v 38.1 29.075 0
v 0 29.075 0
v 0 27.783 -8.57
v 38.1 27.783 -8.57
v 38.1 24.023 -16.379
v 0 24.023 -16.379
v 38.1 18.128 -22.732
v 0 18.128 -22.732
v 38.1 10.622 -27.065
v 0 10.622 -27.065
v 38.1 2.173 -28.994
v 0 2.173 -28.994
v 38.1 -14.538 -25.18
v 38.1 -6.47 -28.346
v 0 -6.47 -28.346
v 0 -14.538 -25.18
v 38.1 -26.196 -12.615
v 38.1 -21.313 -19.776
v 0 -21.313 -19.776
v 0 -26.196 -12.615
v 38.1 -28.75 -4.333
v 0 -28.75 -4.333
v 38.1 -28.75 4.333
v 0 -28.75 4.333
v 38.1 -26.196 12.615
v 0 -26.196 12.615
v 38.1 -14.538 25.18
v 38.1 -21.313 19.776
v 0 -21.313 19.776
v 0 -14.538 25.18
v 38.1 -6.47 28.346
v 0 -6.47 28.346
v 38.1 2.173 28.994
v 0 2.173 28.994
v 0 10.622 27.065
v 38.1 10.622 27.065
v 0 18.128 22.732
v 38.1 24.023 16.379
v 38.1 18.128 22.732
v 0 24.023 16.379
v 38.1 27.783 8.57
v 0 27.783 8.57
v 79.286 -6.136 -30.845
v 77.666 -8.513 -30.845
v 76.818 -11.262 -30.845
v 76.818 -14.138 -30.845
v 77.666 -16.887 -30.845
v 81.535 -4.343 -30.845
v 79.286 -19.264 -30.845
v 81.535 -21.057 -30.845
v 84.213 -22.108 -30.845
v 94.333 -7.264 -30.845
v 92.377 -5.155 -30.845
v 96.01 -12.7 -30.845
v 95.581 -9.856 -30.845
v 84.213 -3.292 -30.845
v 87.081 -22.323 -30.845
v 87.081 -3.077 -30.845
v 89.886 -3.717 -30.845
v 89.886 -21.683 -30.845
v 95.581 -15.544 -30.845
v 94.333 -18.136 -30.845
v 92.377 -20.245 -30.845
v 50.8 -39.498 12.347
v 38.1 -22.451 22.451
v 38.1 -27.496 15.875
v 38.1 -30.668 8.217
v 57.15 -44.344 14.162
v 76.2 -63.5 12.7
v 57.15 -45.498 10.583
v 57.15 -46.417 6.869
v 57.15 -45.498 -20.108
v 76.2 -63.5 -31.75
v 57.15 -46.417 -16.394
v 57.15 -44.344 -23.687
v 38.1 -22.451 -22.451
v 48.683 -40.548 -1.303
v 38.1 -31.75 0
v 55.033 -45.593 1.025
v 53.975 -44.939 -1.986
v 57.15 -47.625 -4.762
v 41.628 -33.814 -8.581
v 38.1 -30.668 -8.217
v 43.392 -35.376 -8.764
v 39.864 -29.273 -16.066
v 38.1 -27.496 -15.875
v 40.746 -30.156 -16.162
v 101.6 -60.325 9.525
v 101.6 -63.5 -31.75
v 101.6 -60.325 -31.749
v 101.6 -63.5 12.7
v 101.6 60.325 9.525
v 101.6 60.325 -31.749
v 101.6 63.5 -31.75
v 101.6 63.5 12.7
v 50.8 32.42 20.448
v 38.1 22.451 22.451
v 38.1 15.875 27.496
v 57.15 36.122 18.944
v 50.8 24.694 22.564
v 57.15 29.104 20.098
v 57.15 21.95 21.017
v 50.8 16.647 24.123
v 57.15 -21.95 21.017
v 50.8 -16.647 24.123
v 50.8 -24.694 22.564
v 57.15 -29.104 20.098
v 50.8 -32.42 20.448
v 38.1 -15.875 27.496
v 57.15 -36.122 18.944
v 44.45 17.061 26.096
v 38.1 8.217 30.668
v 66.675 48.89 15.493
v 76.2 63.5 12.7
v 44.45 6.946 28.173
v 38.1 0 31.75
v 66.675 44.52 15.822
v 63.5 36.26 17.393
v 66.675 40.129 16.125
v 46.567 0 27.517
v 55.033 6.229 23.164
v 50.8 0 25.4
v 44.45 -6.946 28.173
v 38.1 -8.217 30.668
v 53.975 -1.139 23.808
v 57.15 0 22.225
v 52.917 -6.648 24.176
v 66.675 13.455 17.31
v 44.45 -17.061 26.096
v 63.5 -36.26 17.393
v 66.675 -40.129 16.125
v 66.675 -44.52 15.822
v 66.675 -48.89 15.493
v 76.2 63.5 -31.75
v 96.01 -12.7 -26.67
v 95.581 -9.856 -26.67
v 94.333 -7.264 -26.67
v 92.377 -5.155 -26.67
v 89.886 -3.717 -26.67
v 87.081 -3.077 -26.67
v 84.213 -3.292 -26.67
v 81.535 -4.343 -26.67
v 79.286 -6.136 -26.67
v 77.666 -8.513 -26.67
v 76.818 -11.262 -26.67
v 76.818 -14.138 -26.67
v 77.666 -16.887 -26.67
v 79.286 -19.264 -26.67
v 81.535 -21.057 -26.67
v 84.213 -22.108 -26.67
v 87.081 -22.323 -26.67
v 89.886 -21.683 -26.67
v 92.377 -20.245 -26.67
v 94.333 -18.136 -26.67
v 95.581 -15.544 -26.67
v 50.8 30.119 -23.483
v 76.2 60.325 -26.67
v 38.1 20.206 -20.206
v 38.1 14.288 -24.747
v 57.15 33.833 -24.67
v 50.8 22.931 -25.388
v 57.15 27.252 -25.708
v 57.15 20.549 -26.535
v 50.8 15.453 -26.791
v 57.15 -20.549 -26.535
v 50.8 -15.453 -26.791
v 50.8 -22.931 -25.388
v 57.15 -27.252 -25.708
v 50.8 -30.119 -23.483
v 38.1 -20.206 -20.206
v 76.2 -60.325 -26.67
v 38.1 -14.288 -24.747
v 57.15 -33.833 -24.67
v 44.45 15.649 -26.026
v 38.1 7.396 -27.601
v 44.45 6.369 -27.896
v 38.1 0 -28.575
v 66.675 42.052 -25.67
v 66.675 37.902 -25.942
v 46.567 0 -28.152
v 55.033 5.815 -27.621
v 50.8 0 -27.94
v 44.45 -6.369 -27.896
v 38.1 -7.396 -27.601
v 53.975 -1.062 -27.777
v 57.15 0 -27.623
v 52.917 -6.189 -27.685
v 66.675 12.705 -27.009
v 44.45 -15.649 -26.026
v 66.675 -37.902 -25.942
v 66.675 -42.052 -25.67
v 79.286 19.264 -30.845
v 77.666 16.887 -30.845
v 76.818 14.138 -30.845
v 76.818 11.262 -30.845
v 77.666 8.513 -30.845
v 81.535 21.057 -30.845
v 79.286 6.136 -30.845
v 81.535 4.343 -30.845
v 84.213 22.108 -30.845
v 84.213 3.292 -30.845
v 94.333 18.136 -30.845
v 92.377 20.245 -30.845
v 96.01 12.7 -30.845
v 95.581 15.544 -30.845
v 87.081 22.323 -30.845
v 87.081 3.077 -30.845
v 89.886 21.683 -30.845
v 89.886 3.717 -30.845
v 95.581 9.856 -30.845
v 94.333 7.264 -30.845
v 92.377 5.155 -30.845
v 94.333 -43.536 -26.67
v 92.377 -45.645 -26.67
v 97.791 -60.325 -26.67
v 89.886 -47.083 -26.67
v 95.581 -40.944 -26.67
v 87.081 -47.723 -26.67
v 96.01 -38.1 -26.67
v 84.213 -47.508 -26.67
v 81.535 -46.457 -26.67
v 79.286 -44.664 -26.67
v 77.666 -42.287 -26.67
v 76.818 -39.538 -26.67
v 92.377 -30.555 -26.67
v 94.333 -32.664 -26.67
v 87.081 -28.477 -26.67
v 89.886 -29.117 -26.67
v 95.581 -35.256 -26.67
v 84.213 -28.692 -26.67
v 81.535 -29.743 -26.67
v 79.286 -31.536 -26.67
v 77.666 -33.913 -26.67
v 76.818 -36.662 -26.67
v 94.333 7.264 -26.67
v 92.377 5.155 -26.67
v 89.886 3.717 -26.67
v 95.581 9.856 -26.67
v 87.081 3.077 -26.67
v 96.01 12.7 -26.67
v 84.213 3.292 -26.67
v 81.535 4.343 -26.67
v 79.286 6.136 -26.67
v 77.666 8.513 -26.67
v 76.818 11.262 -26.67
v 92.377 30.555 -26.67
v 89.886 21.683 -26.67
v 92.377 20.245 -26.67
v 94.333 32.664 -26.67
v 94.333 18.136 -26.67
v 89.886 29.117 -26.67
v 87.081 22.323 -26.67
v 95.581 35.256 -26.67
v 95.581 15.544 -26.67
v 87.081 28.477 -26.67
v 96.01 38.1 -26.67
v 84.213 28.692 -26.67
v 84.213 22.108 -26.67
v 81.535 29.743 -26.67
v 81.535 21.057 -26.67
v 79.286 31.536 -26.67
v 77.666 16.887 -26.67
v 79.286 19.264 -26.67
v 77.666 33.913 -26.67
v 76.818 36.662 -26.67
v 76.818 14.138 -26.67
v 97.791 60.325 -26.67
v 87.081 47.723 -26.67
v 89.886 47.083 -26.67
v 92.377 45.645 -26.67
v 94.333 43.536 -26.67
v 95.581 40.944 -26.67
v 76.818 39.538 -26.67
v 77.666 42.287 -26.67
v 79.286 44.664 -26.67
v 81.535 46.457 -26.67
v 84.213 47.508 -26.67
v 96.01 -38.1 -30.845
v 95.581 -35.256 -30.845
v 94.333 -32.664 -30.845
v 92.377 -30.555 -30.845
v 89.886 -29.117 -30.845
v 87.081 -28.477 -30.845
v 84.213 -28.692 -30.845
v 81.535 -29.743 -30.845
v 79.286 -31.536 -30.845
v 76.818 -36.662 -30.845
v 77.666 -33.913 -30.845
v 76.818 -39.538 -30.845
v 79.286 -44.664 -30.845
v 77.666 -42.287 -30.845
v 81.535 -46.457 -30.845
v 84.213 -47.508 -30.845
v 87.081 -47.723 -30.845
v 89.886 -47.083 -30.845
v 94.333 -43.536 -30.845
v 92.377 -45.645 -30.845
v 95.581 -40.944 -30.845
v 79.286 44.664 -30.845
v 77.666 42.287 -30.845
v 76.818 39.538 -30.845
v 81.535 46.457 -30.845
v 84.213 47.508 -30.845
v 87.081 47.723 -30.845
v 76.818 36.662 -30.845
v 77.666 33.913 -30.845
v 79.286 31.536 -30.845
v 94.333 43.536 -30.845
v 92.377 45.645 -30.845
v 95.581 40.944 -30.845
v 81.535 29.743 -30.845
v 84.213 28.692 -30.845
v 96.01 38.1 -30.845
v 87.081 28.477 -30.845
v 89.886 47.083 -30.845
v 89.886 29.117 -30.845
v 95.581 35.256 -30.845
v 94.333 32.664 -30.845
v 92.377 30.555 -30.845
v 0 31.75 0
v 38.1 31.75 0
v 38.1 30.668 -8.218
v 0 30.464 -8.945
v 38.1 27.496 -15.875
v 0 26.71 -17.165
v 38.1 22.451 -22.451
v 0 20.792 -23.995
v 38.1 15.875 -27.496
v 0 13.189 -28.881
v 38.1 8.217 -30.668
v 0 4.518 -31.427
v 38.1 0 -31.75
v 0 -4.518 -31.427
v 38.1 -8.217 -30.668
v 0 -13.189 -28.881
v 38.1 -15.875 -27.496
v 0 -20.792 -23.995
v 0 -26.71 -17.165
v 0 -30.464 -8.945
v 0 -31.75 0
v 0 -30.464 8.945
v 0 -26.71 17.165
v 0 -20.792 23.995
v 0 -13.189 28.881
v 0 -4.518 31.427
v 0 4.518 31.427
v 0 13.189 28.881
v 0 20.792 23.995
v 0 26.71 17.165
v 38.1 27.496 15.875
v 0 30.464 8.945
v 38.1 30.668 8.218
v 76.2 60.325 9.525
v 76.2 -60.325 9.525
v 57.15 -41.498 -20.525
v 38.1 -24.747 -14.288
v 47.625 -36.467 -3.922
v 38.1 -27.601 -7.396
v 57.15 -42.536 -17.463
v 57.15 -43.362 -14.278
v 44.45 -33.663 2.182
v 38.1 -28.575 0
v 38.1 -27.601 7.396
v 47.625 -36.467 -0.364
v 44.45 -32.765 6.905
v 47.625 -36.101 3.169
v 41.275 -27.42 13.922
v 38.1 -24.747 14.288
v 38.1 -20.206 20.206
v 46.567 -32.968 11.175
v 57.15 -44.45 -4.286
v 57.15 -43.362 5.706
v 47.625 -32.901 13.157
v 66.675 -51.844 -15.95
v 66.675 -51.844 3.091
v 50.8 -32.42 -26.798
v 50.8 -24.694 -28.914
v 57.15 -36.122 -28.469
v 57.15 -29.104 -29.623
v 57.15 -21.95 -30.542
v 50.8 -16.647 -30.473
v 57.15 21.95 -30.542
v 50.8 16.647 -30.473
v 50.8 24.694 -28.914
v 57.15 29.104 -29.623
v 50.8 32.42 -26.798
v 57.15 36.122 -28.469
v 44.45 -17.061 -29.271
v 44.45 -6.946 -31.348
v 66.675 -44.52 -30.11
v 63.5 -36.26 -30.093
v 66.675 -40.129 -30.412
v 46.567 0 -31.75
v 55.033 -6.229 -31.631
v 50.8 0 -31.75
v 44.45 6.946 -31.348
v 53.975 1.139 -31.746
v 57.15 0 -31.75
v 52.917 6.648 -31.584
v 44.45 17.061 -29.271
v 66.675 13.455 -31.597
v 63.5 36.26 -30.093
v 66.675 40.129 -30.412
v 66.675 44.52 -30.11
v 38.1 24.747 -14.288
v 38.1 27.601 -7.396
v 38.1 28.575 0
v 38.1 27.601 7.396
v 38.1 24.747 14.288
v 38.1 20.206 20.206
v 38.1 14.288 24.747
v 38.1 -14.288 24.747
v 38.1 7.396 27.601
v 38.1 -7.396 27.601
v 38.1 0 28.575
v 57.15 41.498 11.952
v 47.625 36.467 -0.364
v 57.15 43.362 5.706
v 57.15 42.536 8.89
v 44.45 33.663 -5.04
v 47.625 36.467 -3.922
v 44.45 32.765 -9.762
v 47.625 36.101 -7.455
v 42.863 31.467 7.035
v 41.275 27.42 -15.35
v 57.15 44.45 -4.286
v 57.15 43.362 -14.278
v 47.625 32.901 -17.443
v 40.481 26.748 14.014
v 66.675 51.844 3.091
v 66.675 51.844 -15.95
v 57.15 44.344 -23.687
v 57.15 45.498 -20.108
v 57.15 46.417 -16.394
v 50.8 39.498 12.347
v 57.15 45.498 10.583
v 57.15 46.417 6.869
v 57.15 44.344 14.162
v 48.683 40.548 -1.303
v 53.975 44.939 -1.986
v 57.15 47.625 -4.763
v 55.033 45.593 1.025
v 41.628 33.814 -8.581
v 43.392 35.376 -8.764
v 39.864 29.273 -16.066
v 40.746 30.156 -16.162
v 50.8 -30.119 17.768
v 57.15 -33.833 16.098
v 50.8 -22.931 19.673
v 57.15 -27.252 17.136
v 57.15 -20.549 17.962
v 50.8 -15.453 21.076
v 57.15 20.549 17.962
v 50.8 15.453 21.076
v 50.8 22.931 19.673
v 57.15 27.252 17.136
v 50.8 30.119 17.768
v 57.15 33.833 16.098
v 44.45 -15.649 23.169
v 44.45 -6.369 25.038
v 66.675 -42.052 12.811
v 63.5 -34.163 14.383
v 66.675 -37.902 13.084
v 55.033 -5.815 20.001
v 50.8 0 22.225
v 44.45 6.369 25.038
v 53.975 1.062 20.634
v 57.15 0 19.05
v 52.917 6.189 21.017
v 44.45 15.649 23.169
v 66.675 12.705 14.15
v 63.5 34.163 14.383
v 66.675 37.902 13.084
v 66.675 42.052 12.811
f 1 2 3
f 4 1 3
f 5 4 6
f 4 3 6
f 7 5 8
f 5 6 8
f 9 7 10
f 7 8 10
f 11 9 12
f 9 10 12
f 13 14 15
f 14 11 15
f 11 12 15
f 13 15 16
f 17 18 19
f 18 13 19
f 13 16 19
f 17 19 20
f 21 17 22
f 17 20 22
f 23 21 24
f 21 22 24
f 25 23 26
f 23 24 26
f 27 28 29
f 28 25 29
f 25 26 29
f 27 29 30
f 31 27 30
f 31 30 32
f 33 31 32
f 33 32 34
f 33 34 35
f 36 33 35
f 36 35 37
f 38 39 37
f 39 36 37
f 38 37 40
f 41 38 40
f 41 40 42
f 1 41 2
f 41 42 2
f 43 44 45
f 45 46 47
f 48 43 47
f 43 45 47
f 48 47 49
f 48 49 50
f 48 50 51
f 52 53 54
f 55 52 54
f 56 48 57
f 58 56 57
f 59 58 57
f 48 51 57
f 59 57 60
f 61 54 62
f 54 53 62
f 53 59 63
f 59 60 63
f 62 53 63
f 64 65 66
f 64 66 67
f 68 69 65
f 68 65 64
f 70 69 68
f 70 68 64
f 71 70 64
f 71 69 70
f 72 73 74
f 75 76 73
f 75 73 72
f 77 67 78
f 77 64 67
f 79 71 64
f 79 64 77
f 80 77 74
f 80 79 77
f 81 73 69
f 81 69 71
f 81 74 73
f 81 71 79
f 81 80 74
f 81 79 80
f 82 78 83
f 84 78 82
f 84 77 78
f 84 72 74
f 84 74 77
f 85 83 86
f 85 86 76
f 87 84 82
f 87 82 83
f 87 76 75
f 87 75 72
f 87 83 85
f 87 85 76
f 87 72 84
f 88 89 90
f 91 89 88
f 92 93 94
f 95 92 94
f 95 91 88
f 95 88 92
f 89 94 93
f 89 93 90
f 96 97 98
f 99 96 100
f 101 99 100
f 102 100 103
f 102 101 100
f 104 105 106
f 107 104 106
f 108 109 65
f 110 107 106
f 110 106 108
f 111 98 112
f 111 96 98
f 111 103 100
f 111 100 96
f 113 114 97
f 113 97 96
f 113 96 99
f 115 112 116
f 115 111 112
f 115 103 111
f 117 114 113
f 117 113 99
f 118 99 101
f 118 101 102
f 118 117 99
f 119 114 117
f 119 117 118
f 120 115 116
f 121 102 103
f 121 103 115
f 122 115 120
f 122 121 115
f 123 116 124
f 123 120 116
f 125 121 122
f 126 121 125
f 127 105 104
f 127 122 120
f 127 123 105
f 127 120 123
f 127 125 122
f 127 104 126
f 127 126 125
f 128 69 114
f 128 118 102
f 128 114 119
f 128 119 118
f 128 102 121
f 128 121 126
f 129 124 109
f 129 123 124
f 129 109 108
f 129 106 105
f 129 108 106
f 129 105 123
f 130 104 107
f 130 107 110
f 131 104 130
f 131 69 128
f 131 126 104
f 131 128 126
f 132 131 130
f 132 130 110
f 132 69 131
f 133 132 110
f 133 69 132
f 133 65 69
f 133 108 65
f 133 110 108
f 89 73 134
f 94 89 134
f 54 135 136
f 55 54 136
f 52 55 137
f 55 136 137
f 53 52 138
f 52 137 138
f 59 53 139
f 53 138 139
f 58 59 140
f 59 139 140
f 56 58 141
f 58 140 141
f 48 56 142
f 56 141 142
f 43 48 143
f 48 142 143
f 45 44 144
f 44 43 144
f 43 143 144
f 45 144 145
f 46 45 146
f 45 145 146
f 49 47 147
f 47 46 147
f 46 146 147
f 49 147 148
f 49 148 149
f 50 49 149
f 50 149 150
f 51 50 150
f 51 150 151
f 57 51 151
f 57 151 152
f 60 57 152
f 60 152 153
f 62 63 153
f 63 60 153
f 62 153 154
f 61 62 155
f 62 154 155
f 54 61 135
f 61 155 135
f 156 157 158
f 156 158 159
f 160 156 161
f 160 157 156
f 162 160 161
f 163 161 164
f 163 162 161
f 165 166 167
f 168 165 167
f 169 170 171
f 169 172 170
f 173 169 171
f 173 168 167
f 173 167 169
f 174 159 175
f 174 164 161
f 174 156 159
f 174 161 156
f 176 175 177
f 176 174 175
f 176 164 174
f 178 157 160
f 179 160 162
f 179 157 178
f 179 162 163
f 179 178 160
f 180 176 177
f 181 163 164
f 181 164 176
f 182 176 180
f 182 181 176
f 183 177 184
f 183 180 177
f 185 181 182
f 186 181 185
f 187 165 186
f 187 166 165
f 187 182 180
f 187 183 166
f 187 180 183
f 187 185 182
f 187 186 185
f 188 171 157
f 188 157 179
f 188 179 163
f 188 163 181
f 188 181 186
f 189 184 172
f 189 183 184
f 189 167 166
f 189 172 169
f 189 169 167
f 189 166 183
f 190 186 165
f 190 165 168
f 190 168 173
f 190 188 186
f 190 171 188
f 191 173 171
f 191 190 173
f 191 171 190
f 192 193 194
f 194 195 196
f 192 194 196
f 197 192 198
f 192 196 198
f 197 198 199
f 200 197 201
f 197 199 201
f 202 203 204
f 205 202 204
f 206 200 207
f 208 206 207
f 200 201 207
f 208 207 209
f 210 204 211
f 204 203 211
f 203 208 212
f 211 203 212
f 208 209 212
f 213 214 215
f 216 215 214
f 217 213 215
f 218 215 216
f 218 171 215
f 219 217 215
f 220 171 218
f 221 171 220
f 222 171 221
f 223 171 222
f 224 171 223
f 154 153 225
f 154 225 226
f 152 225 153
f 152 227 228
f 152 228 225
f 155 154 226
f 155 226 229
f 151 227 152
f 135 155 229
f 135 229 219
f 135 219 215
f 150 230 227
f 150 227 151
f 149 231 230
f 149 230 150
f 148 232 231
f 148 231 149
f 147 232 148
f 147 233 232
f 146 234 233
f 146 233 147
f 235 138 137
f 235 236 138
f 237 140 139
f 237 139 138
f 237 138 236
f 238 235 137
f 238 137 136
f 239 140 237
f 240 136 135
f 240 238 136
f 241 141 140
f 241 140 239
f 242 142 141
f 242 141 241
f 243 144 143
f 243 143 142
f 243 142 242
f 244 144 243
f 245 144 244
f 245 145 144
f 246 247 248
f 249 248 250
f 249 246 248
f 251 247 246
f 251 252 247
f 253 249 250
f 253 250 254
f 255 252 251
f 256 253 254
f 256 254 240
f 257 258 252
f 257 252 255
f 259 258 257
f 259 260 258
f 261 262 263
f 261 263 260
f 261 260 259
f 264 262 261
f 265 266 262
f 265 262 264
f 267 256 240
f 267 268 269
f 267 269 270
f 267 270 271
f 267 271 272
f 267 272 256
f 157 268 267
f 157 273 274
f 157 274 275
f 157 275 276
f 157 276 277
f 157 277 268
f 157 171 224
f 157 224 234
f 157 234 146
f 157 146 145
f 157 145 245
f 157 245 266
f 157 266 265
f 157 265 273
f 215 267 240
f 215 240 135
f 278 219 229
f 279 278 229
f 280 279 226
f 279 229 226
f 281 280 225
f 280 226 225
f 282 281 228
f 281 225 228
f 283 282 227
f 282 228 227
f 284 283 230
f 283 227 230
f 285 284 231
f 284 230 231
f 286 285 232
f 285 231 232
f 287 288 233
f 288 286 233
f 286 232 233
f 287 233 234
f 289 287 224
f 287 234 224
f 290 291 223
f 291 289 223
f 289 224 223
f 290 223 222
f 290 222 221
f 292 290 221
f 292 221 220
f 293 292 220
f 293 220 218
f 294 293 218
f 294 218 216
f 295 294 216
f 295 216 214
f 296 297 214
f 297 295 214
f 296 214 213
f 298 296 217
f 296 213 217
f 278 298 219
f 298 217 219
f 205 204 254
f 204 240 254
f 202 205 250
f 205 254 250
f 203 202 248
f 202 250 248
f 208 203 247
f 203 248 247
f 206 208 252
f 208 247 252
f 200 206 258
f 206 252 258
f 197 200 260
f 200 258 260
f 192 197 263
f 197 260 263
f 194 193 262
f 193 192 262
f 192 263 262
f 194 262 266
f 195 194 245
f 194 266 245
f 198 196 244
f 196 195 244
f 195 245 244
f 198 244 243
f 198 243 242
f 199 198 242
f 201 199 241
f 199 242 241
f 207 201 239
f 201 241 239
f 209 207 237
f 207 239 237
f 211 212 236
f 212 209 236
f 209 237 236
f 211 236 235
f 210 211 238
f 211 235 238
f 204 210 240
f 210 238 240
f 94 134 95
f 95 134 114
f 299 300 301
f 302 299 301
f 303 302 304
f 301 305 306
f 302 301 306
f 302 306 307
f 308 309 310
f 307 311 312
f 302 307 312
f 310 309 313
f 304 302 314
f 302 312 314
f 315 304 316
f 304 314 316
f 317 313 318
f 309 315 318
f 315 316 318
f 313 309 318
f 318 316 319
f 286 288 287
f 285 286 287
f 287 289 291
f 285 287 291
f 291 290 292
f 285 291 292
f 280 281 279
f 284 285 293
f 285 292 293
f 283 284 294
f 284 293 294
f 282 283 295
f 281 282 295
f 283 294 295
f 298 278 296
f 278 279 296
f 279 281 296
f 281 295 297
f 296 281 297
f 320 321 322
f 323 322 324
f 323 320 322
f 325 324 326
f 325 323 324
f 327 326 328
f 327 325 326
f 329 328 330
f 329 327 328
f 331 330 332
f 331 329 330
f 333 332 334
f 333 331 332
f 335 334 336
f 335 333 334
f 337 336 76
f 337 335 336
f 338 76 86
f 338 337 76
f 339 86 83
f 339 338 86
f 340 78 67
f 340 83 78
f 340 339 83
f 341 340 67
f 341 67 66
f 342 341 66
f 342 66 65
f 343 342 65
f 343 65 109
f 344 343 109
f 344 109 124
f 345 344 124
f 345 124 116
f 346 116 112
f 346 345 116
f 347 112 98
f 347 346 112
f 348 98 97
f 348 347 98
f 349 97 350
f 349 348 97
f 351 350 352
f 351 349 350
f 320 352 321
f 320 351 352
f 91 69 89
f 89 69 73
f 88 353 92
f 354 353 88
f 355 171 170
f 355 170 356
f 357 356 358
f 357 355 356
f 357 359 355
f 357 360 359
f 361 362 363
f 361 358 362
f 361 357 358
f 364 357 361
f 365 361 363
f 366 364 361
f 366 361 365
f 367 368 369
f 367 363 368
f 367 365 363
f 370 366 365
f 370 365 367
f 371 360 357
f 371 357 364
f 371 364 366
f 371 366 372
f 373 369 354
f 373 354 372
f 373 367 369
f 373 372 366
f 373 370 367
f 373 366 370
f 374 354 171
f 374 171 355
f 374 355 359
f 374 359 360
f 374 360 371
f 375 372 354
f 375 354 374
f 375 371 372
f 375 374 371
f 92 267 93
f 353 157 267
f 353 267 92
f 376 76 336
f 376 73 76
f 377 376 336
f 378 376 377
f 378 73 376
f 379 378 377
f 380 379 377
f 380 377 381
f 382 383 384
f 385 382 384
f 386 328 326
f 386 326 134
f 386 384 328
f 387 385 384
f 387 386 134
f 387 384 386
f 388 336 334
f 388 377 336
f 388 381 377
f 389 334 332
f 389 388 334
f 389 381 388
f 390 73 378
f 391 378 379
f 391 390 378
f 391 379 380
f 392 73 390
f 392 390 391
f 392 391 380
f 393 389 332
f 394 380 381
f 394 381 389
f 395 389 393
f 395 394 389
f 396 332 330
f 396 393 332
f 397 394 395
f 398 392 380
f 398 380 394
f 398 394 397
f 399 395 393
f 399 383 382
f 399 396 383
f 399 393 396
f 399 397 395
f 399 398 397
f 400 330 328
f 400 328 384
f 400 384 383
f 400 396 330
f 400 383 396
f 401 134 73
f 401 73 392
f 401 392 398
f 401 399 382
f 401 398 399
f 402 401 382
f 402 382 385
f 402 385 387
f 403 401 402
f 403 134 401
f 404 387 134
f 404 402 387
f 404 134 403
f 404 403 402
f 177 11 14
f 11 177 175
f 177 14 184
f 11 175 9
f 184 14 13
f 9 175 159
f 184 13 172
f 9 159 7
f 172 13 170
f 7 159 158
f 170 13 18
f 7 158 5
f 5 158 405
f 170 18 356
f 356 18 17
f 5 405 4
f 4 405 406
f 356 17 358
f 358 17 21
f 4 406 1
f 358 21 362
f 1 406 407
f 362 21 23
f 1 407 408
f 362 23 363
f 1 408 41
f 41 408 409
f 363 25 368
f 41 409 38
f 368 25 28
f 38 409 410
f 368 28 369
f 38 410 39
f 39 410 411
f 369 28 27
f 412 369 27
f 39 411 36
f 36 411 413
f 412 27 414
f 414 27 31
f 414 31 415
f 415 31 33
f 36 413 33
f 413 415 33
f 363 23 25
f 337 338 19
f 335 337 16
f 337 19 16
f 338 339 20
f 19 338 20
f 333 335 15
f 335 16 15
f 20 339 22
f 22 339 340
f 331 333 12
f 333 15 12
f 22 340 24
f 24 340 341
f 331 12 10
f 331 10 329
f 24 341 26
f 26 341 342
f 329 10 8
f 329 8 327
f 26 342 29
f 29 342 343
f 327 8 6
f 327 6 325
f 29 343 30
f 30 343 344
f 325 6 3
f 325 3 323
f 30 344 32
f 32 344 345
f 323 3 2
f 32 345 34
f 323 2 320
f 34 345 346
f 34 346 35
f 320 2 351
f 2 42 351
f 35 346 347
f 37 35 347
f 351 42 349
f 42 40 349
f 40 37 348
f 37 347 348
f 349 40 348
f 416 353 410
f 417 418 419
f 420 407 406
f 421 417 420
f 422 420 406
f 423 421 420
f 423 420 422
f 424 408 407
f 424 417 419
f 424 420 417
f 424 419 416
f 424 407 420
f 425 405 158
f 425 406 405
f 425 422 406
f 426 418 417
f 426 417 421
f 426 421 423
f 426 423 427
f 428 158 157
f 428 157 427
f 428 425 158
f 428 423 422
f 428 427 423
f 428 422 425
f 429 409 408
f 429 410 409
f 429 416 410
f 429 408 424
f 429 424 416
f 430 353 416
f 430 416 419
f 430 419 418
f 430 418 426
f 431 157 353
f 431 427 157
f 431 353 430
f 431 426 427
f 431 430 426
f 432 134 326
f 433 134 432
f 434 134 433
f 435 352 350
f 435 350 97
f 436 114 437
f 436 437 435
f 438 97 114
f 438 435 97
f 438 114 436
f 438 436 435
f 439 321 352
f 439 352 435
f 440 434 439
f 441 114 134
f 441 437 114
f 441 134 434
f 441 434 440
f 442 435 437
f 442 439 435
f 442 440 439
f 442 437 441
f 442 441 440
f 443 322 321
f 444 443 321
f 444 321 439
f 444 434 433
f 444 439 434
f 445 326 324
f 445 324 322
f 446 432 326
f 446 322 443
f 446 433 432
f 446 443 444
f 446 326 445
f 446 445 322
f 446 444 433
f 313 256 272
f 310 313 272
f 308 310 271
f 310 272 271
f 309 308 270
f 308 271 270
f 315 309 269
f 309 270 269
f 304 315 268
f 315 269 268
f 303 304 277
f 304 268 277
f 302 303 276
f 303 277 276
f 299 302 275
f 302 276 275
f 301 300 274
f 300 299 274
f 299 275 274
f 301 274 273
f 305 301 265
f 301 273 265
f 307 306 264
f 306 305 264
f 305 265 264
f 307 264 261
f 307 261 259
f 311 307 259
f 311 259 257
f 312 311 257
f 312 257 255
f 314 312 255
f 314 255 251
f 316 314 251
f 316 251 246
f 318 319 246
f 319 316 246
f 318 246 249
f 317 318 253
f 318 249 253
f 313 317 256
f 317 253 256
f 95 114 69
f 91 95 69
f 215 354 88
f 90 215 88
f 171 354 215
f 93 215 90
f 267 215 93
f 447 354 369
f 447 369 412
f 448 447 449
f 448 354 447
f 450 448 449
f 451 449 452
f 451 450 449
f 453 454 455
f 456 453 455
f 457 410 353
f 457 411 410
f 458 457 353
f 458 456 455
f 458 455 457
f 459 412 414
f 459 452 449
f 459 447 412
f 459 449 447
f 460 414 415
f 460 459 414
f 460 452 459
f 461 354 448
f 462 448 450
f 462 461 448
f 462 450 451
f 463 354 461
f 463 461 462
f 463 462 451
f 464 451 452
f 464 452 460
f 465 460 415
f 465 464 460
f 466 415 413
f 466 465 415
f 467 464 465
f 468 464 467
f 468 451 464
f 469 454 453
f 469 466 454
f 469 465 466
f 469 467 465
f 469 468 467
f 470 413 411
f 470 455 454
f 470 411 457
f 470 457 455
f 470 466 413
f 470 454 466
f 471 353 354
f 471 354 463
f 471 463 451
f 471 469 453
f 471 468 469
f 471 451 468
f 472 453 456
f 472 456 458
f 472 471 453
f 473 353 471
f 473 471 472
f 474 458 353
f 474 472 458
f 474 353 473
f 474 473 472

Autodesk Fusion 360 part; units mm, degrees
sketch "Sketch1" plane through (0, 0, 0) normal (1, 0, 0) x (0, 1, 0)
  circle A0 centre (0, 0) radius 29.075
  circle A1 centre (0, 0) radius 31.75
  dimension "d1" = 58.15
  dimension "d2" = 63.5
extrude "Extrude1" add sketch "Sketch1" along normal blind 38.1
ref_plane "WorkPlane1" through (76.2, 0, 0) normal (1, 0, 0) x (0, 1, 0)
sketch "Sketch2" plane through (76.2, 0, 0) normal (1, 0, 0) x (0, 1, 0)
  line L0 (-63.5, -31.75) -> (63.5, -31.75)
  line L1 (63.5, -31.75) -> (63.5, 12.7)
  line L2 (63.5, 12.7) -> (-63.5, 12.7)
  line L3 (-63.5, 12.7) -> (-63.5, -31.75)
  circle A0 centre (0, 0) radius 31.75 construction
  line L4 (-60.325, -26.67) -> (60.325, -26.67)
  line L5 (60.325, -26.67) -> (60.325, 9.525)
  line L6 (60.325, 9.525) -> (-60.325, 9.525)
  line L7 (-60.325, 9.525) -> (-60.325, -26.67)
  dimension "d6" = 63.5
  dimension "d7" = 63.5
  dimension "d8" = 44.45
sketch "Sketch3" plane through (38.1, 0, 0) normal (1, 0, 0) x (0, 1, 0)
  line L0 (0, 0) -> (-24.2467, -24.2467) construction
  arc A0 (-20.2056, 20.2056) -> (-20.2056, -20.2056) centre (0, 0) ccw
  arc A1 (20.2056, 20.2056) -> (-20.2056, 20.2056) centre (0, 0) ccw
  arc A2 (20.2056, -20.2056) -> (20.2056, 20.2056) centre (0, 0) ccw
  arc A3 (-20.2056, -20.2056) -> (20.2056, -20.2056) centre (0, 0) ccw
  arc A4 (-22.4506, 22.4506) -> (-22.4506, -22.4506) centre (0, 0) ccw
  line L1 (0, 0) -> (-22.4506, 22.4506) construction
  line L2 (0, 0) -> (-22.4506, -22.4506) construction
  arc A5 (22.4506, 22.4506) -> (-22.4506, 22.4506) centre (0, 0) ccw
  line L3 (0, 0) -> (22.4506, 22.4506) construction
  line L4 (0, 0) -> (-22.4506, 22.4506) construction
  arc A6 (22.4506, -22.4506) -> (22.4506, 22.4506) centre (0, 0) ccw
  line L5 (0, 0) -> (22.4506, -22.4506) construction
  line L6 (0, 0) -> (22.4506, 22.4506) construction
  arc A7 (-22.4506, -22.4506) -> (22.4506, -22.4506) centre (0, 0) ccw
  dimension "d10" = 28.575
  dimension "d11" = 31.75
  dimension "d12" = 90
  dimension "d13" = 90
  dimension "d14" = 90
loft "Loft1" add profiles "Sketch3", "Sketch2" section 1 section 2
loft "Loft2" cut profiles "Sketch3", "Sketch2" section 1 contours A0 A1 A2 A3 section 2 contours L4 L5 L6 L7
extrude "Extrude2" add sketch "Sketch2" along normal blind 25.4
sketch "Sketch4" plane through (0, 0, -26.67) normal (0, 0, -1) x (1, 0, 0)
  circle A0 centre (86.36, 38.1) radius 9.65
  circle A1 centre (86.36, -38.1) radius 9.65
  line L0 (76.2, 63.5) -> (101.6, 63.5) construction
  line L1 (76.2, -63.5) -> (101.6, -63.5) construction
  line L2 (86.36, 63.5) -> (86.36, -63.5) construction
  circle A2 centre (86.36, 12.7) radius 9.65
  circle A3 centre (86.36, -12.7) radius 9.65
  dimension "d18" = 19.3
  dimension "d20" = 19.3
  dimension "d28" = 19.3
  dimension "d29" = 19.3
  dimension "d30" = 25.4
  dimension "d31" = 25.4
  dimension "d32" = 25.4
  dimension "d33" = 25.4
  dimension "d35" = 10.16
extrude "Extrude3" cut sketch "Sketch4" along normal blind 4.175
chamfer "Chamfer1" distance 5.08 distance2 3.81 1 edges at (101.6, 0, -26.67) measured on face at (101.6, 20.1083, -30.0567)
equation "d1 = 2.25 in + 1 mm"
equation "d2 = 2.25 in + 0.25 in"
equation "d18 = magnetDiameter + magnetClearance"
equation "d20 = magnetDiameter + magnetClearance"
equation "d25 = magnetHeight + 1 mm"
equation "d28 = magnetDiameter + magnetClearance"
equation "d29 = magnetDiameter + magnetClearance"
equation "magnetDiameter = 0.75 in"
equation "magnetClearance = 0.25 mm"
equation "magnetHeight = ( 1 / 8 ) * 1 in"
